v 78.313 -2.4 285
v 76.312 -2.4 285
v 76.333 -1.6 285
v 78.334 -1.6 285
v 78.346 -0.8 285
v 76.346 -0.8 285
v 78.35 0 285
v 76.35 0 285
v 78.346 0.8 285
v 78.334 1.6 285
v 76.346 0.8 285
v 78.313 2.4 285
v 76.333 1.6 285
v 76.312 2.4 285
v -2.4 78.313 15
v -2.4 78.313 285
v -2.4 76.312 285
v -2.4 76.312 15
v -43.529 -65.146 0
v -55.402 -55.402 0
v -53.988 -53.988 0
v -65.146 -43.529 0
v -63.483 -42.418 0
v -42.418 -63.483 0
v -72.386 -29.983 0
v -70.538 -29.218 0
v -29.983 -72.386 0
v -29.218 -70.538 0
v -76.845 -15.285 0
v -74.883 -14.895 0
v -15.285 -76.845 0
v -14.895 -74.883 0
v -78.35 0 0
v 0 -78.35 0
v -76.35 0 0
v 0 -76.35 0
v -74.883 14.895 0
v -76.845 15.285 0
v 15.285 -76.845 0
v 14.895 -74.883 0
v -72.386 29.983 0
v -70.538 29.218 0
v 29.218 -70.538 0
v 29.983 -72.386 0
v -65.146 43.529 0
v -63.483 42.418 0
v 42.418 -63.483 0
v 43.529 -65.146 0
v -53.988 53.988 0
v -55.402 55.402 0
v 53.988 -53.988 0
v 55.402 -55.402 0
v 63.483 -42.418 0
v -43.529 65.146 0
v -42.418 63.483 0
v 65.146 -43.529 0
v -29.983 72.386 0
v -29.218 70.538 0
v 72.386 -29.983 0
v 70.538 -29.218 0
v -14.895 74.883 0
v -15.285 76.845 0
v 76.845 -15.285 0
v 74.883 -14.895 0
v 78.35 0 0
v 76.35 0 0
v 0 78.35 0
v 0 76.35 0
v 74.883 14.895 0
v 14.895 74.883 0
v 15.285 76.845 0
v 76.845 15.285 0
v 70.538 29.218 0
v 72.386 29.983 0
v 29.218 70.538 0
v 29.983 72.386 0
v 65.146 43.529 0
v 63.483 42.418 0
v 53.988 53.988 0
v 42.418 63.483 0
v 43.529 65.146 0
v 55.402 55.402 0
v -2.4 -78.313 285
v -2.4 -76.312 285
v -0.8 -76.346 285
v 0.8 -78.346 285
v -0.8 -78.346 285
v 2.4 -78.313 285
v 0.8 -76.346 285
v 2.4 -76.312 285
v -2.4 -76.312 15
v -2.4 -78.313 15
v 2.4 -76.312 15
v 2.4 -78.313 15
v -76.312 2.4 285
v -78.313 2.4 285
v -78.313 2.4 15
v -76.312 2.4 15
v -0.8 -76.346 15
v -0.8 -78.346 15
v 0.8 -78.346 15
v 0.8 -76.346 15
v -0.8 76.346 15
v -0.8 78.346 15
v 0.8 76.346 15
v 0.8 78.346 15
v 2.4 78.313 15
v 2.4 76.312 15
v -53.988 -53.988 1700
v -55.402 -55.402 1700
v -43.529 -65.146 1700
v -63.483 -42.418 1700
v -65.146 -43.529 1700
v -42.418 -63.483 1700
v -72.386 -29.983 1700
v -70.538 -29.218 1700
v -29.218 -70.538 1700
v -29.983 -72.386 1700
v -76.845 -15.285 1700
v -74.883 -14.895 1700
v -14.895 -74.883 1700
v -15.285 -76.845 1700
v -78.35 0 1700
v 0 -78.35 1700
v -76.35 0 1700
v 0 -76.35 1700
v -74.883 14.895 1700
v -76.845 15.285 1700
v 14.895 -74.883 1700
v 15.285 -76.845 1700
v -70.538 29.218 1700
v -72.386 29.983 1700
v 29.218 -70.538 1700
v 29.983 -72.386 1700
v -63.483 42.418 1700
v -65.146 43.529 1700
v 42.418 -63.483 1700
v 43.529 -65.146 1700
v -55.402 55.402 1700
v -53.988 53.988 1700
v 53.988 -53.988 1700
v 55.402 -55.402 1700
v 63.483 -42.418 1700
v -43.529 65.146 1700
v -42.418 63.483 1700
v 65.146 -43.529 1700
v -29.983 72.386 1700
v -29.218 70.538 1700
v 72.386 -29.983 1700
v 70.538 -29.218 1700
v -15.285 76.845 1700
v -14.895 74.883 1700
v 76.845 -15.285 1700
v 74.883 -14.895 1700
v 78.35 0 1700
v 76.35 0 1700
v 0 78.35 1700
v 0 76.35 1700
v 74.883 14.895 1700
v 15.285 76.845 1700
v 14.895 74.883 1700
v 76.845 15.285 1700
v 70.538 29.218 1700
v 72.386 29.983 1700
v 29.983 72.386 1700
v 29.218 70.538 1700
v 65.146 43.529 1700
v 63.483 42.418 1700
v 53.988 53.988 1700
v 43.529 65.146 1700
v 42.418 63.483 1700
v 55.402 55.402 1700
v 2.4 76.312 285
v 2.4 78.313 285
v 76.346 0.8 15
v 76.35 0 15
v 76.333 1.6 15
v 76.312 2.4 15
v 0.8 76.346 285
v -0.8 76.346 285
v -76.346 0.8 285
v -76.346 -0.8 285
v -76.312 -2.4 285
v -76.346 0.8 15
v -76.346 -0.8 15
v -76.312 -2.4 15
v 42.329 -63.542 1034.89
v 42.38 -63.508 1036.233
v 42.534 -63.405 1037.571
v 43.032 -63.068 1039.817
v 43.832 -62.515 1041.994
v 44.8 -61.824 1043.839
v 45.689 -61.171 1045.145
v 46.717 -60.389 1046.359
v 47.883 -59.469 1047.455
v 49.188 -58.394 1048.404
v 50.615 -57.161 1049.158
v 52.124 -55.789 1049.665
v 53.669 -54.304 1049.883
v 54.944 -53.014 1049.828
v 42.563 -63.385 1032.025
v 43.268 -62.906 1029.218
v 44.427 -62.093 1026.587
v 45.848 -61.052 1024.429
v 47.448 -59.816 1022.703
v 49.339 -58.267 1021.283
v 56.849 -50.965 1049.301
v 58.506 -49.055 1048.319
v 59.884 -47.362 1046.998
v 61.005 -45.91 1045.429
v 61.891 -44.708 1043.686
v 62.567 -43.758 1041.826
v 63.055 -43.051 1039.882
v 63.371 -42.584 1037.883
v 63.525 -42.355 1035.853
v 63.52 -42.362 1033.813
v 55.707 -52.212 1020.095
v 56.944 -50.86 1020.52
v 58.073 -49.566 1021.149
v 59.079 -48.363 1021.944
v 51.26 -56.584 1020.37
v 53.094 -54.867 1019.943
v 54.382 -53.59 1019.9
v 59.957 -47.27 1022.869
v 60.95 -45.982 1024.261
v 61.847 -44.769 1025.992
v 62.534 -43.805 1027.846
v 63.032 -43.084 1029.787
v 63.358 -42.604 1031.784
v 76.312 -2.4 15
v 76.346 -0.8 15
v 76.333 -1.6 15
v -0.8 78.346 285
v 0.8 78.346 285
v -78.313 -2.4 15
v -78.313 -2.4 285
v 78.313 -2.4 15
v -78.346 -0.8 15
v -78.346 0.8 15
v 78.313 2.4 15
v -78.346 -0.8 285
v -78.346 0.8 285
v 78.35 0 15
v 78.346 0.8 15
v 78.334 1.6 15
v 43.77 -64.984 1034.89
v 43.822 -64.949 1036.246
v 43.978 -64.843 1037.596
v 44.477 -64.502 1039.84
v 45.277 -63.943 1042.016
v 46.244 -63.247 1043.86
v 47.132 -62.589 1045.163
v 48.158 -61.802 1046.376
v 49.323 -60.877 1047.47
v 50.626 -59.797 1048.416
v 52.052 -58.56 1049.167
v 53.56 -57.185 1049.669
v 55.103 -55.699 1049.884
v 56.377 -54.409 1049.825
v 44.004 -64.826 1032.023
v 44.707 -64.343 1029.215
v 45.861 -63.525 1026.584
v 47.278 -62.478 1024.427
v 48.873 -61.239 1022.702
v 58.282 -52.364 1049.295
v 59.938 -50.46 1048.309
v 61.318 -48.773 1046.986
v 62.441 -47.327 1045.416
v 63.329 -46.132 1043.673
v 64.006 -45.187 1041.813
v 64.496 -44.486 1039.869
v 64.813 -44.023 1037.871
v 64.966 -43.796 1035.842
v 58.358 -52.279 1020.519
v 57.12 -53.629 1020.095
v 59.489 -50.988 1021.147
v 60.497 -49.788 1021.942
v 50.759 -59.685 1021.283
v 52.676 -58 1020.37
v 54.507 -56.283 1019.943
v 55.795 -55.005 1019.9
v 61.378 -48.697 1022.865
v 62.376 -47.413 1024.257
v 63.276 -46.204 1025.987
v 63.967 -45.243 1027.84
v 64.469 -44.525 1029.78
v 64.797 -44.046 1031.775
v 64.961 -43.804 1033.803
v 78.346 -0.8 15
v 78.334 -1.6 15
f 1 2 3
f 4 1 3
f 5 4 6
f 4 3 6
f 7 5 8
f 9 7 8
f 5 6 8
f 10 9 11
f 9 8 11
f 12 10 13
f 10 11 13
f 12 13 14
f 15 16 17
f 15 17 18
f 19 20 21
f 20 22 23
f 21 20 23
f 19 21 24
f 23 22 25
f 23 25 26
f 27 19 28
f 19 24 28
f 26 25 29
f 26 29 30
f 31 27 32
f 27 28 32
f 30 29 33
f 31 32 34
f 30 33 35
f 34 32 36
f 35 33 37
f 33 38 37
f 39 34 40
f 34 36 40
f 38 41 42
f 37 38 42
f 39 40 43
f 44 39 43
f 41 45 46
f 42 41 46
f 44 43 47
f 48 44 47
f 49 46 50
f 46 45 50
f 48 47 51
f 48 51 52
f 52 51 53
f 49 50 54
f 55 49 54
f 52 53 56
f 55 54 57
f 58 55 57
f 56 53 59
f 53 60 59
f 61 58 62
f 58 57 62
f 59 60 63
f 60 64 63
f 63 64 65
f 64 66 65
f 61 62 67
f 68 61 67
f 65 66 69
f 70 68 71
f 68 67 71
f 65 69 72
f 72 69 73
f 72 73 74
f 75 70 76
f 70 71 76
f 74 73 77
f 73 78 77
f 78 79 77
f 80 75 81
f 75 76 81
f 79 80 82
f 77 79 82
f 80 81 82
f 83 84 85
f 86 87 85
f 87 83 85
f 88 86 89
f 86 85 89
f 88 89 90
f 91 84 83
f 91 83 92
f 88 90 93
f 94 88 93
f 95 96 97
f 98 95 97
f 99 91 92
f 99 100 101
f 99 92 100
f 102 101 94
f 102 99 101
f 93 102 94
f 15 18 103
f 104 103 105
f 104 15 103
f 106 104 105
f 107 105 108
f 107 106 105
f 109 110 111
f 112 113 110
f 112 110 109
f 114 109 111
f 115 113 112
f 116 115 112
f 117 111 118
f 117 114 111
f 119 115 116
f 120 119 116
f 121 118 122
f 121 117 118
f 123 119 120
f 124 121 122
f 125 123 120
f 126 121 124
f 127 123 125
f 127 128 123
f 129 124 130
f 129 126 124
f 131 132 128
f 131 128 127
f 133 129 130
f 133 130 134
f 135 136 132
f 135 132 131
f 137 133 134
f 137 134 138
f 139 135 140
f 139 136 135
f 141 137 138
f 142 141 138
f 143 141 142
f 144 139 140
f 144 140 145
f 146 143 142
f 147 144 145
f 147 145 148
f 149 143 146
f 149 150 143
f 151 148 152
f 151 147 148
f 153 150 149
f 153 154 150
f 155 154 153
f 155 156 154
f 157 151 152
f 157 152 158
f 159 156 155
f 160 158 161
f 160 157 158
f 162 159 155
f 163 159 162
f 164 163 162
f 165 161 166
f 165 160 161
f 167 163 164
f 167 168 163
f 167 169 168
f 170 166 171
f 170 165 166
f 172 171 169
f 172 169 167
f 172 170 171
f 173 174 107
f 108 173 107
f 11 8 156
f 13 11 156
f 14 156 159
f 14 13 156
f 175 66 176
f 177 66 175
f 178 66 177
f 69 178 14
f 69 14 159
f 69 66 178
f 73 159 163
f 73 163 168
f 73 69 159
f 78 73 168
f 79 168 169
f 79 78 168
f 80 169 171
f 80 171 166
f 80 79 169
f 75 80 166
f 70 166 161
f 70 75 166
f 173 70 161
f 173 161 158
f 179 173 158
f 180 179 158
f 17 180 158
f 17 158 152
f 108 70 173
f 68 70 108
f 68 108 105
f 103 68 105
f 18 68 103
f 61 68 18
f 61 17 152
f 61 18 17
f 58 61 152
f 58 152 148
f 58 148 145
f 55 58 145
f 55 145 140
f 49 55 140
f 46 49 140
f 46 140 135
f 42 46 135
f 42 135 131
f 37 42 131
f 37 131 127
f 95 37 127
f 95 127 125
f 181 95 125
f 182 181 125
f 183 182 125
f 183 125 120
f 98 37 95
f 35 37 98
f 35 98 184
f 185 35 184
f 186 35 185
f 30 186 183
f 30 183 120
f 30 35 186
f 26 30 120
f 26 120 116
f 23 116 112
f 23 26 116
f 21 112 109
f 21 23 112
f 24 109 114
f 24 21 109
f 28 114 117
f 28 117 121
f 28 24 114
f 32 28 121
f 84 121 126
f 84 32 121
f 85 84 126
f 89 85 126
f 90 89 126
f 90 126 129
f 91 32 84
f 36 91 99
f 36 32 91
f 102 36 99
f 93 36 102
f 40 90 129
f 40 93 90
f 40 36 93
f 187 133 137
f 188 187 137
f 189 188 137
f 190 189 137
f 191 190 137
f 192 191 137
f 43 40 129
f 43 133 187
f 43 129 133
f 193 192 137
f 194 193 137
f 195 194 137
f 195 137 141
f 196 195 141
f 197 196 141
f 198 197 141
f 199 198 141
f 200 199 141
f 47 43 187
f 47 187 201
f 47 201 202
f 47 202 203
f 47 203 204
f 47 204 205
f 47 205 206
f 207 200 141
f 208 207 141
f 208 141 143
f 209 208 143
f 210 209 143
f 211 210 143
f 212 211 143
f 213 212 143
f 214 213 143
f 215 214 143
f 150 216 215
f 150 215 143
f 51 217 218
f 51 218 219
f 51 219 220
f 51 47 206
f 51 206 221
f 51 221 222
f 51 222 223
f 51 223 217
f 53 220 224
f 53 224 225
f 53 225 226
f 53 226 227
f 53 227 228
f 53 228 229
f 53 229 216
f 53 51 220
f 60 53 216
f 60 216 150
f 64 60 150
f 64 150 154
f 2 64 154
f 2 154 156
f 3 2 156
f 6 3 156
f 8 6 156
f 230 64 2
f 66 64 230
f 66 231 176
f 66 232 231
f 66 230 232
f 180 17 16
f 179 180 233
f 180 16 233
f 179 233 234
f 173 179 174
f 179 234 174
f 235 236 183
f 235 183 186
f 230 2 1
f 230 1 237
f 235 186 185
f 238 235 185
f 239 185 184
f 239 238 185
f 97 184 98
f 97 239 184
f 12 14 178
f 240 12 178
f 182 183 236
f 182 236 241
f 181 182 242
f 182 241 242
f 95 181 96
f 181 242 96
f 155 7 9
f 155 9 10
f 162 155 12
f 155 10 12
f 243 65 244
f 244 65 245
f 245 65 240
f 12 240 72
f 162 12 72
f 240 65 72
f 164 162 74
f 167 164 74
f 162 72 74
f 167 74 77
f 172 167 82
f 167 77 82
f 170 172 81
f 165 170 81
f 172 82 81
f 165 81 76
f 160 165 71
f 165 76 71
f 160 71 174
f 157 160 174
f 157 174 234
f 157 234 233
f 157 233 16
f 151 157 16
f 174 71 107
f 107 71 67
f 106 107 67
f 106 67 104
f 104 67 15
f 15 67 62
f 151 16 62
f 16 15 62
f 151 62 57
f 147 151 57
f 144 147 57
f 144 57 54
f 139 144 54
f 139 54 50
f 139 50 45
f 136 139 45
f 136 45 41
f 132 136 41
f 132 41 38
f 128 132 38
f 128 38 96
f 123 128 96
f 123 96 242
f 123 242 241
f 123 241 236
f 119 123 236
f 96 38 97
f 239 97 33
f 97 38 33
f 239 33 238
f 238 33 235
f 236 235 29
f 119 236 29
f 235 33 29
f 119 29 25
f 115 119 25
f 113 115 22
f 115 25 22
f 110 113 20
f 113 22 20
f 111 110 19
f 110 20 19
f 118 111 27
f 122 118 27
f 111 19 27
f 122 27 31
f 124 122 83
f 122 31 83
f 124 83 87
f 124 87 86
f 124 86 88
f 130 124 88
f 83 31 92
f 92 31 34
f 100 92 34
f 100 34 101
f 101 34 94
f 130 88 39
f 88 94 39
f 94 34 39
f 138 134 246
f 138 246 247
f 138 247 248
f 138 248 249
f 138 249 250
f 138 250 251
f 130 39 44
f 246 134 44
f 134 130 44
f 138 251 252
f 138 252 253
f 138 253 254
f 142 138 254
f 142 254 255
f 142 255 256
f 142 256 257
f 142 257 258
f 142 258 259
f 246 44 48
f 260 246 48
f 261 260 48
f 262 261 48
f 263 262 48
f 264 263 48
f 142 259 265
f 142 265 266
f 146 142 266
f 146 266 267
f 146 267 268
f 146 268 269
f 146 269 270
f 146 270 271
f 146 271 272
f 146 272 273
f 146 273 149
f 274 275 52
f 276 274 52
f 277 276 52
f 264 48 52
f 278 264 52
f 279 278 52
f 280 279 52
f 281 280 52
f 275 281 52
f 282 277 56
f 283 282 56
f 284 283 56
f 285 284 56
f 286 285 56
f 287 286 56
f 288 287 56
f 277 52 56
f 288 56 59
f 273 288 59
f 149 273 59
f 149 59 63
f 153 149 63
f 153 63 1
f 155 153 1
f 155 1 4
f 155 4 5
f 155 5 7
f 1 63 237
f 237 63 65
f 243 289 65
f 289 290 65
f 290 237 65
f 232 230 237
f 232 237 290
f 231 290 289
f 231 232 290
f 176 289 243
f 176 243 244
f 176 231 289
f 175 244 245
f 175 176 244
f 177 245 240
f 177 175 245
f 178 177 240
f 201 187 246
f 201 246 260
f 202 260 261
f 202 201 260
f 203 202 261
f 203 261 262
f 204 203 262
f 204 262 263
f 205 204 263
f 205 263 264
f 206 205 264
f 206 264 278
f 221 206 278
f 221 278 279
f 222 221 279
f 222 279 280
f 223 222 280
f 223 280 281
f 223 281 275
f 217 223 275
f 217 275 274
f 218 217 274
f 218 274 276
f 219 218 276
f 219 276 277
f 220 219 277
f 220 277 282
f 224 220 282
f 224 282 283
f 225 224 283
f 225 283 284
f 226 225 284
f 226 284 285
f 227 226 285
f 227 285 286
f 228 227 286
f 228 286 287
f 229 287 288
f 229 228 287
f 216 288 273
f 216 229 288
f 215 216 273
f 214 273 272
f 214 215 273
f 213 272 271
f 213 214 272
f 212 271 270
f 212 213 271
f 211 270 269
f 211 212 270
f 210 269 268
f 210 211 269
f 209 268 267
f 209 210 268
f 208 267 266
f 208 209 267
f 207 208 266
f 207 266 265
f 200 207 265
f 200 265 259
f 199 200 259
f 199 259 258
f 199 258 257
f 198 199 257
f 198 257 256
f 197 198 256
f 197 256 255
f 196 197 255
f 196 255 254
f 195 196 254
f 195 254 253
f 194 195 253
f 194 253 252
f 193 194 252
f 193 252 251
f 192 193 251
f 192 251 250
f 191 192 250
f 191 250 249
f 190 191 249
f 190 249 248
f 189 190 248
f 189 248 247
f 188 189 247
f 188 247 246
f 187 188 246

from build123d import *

# Parameters (mm, degrees)
SKETCH1_R           = 78.35
SKETCH1_R_2         = 76.35
BOSS_EXTRUDE1_DEPTH = 1700
SKETCH5_R           = 15
CUT_EXTRUDE2_DEPTH  = 1704.607186237
SKETCH6_W           = 4.8
SKETCH6_H           = 270
CUT_EXTRUDE3_DEPTH  = 1704.607186346
CIRPATTERN1_COUNT   = 2
CIRPATTERN1_ANGLE   = 90


with BuildPart() as part:
    # Sketch1 → Boss-Extrude1 (new body)
    with BuildSketch(Plane.XY):
        Circle(SKETCH1_R)
        Circle(SKETCH1_R_2, mode=Mode.SUBTRACT)
    extrude(amount=BOSS_EXTRUDE1_DEPTH)

    # Sketch5 → Cut-Extrude2 (cut, through all)
    with BuildSketch(Plane(origin=(0, 0, 0), x_dir=(0, 0, -1), z_dir=(0.7071067811865489, -0.7071067811865462, 0))):
        with Locations(Location((-1034.89, 0, 0), (0, 0, 270))):
            Circle(SKETCH5_R)
    extrude(amount=CUT_EXTRUDE2_DEPTH, mode=Mode.SUBTRACT)

    # Sketch6 → Cut-Extrude3 (cut, symmetric)
    with BuildSketch(Plane(origin=(0, 0, 0), x_dir=(1, 0, 0), z_dir=(0, 1, 0))):
        with Locations((0, -150)):
            Rectangle(SKETCH6_W, SKETCH6_H)
    cut_extrude3 = extrude(amount=CUT_EXTRUDE3_DEPTH, both=True, mode=Mode.SUBTRACT)

    # CirPattern1: Cut-Extrude3 ×2 about axis
    cirpattern1_axis = Axis((0, 0, 0), (0, 0, 1))
    for i in range(1, CIRPATTERN1_COUNT):
        add(cut_extrude3.rotate(cirpattern1_axis, i * CIRPATTERN1_ANGLE / (CIRPATTERN1_COUNT - 1)), mode=Mode.SUBTRACT)


solid = part.part
